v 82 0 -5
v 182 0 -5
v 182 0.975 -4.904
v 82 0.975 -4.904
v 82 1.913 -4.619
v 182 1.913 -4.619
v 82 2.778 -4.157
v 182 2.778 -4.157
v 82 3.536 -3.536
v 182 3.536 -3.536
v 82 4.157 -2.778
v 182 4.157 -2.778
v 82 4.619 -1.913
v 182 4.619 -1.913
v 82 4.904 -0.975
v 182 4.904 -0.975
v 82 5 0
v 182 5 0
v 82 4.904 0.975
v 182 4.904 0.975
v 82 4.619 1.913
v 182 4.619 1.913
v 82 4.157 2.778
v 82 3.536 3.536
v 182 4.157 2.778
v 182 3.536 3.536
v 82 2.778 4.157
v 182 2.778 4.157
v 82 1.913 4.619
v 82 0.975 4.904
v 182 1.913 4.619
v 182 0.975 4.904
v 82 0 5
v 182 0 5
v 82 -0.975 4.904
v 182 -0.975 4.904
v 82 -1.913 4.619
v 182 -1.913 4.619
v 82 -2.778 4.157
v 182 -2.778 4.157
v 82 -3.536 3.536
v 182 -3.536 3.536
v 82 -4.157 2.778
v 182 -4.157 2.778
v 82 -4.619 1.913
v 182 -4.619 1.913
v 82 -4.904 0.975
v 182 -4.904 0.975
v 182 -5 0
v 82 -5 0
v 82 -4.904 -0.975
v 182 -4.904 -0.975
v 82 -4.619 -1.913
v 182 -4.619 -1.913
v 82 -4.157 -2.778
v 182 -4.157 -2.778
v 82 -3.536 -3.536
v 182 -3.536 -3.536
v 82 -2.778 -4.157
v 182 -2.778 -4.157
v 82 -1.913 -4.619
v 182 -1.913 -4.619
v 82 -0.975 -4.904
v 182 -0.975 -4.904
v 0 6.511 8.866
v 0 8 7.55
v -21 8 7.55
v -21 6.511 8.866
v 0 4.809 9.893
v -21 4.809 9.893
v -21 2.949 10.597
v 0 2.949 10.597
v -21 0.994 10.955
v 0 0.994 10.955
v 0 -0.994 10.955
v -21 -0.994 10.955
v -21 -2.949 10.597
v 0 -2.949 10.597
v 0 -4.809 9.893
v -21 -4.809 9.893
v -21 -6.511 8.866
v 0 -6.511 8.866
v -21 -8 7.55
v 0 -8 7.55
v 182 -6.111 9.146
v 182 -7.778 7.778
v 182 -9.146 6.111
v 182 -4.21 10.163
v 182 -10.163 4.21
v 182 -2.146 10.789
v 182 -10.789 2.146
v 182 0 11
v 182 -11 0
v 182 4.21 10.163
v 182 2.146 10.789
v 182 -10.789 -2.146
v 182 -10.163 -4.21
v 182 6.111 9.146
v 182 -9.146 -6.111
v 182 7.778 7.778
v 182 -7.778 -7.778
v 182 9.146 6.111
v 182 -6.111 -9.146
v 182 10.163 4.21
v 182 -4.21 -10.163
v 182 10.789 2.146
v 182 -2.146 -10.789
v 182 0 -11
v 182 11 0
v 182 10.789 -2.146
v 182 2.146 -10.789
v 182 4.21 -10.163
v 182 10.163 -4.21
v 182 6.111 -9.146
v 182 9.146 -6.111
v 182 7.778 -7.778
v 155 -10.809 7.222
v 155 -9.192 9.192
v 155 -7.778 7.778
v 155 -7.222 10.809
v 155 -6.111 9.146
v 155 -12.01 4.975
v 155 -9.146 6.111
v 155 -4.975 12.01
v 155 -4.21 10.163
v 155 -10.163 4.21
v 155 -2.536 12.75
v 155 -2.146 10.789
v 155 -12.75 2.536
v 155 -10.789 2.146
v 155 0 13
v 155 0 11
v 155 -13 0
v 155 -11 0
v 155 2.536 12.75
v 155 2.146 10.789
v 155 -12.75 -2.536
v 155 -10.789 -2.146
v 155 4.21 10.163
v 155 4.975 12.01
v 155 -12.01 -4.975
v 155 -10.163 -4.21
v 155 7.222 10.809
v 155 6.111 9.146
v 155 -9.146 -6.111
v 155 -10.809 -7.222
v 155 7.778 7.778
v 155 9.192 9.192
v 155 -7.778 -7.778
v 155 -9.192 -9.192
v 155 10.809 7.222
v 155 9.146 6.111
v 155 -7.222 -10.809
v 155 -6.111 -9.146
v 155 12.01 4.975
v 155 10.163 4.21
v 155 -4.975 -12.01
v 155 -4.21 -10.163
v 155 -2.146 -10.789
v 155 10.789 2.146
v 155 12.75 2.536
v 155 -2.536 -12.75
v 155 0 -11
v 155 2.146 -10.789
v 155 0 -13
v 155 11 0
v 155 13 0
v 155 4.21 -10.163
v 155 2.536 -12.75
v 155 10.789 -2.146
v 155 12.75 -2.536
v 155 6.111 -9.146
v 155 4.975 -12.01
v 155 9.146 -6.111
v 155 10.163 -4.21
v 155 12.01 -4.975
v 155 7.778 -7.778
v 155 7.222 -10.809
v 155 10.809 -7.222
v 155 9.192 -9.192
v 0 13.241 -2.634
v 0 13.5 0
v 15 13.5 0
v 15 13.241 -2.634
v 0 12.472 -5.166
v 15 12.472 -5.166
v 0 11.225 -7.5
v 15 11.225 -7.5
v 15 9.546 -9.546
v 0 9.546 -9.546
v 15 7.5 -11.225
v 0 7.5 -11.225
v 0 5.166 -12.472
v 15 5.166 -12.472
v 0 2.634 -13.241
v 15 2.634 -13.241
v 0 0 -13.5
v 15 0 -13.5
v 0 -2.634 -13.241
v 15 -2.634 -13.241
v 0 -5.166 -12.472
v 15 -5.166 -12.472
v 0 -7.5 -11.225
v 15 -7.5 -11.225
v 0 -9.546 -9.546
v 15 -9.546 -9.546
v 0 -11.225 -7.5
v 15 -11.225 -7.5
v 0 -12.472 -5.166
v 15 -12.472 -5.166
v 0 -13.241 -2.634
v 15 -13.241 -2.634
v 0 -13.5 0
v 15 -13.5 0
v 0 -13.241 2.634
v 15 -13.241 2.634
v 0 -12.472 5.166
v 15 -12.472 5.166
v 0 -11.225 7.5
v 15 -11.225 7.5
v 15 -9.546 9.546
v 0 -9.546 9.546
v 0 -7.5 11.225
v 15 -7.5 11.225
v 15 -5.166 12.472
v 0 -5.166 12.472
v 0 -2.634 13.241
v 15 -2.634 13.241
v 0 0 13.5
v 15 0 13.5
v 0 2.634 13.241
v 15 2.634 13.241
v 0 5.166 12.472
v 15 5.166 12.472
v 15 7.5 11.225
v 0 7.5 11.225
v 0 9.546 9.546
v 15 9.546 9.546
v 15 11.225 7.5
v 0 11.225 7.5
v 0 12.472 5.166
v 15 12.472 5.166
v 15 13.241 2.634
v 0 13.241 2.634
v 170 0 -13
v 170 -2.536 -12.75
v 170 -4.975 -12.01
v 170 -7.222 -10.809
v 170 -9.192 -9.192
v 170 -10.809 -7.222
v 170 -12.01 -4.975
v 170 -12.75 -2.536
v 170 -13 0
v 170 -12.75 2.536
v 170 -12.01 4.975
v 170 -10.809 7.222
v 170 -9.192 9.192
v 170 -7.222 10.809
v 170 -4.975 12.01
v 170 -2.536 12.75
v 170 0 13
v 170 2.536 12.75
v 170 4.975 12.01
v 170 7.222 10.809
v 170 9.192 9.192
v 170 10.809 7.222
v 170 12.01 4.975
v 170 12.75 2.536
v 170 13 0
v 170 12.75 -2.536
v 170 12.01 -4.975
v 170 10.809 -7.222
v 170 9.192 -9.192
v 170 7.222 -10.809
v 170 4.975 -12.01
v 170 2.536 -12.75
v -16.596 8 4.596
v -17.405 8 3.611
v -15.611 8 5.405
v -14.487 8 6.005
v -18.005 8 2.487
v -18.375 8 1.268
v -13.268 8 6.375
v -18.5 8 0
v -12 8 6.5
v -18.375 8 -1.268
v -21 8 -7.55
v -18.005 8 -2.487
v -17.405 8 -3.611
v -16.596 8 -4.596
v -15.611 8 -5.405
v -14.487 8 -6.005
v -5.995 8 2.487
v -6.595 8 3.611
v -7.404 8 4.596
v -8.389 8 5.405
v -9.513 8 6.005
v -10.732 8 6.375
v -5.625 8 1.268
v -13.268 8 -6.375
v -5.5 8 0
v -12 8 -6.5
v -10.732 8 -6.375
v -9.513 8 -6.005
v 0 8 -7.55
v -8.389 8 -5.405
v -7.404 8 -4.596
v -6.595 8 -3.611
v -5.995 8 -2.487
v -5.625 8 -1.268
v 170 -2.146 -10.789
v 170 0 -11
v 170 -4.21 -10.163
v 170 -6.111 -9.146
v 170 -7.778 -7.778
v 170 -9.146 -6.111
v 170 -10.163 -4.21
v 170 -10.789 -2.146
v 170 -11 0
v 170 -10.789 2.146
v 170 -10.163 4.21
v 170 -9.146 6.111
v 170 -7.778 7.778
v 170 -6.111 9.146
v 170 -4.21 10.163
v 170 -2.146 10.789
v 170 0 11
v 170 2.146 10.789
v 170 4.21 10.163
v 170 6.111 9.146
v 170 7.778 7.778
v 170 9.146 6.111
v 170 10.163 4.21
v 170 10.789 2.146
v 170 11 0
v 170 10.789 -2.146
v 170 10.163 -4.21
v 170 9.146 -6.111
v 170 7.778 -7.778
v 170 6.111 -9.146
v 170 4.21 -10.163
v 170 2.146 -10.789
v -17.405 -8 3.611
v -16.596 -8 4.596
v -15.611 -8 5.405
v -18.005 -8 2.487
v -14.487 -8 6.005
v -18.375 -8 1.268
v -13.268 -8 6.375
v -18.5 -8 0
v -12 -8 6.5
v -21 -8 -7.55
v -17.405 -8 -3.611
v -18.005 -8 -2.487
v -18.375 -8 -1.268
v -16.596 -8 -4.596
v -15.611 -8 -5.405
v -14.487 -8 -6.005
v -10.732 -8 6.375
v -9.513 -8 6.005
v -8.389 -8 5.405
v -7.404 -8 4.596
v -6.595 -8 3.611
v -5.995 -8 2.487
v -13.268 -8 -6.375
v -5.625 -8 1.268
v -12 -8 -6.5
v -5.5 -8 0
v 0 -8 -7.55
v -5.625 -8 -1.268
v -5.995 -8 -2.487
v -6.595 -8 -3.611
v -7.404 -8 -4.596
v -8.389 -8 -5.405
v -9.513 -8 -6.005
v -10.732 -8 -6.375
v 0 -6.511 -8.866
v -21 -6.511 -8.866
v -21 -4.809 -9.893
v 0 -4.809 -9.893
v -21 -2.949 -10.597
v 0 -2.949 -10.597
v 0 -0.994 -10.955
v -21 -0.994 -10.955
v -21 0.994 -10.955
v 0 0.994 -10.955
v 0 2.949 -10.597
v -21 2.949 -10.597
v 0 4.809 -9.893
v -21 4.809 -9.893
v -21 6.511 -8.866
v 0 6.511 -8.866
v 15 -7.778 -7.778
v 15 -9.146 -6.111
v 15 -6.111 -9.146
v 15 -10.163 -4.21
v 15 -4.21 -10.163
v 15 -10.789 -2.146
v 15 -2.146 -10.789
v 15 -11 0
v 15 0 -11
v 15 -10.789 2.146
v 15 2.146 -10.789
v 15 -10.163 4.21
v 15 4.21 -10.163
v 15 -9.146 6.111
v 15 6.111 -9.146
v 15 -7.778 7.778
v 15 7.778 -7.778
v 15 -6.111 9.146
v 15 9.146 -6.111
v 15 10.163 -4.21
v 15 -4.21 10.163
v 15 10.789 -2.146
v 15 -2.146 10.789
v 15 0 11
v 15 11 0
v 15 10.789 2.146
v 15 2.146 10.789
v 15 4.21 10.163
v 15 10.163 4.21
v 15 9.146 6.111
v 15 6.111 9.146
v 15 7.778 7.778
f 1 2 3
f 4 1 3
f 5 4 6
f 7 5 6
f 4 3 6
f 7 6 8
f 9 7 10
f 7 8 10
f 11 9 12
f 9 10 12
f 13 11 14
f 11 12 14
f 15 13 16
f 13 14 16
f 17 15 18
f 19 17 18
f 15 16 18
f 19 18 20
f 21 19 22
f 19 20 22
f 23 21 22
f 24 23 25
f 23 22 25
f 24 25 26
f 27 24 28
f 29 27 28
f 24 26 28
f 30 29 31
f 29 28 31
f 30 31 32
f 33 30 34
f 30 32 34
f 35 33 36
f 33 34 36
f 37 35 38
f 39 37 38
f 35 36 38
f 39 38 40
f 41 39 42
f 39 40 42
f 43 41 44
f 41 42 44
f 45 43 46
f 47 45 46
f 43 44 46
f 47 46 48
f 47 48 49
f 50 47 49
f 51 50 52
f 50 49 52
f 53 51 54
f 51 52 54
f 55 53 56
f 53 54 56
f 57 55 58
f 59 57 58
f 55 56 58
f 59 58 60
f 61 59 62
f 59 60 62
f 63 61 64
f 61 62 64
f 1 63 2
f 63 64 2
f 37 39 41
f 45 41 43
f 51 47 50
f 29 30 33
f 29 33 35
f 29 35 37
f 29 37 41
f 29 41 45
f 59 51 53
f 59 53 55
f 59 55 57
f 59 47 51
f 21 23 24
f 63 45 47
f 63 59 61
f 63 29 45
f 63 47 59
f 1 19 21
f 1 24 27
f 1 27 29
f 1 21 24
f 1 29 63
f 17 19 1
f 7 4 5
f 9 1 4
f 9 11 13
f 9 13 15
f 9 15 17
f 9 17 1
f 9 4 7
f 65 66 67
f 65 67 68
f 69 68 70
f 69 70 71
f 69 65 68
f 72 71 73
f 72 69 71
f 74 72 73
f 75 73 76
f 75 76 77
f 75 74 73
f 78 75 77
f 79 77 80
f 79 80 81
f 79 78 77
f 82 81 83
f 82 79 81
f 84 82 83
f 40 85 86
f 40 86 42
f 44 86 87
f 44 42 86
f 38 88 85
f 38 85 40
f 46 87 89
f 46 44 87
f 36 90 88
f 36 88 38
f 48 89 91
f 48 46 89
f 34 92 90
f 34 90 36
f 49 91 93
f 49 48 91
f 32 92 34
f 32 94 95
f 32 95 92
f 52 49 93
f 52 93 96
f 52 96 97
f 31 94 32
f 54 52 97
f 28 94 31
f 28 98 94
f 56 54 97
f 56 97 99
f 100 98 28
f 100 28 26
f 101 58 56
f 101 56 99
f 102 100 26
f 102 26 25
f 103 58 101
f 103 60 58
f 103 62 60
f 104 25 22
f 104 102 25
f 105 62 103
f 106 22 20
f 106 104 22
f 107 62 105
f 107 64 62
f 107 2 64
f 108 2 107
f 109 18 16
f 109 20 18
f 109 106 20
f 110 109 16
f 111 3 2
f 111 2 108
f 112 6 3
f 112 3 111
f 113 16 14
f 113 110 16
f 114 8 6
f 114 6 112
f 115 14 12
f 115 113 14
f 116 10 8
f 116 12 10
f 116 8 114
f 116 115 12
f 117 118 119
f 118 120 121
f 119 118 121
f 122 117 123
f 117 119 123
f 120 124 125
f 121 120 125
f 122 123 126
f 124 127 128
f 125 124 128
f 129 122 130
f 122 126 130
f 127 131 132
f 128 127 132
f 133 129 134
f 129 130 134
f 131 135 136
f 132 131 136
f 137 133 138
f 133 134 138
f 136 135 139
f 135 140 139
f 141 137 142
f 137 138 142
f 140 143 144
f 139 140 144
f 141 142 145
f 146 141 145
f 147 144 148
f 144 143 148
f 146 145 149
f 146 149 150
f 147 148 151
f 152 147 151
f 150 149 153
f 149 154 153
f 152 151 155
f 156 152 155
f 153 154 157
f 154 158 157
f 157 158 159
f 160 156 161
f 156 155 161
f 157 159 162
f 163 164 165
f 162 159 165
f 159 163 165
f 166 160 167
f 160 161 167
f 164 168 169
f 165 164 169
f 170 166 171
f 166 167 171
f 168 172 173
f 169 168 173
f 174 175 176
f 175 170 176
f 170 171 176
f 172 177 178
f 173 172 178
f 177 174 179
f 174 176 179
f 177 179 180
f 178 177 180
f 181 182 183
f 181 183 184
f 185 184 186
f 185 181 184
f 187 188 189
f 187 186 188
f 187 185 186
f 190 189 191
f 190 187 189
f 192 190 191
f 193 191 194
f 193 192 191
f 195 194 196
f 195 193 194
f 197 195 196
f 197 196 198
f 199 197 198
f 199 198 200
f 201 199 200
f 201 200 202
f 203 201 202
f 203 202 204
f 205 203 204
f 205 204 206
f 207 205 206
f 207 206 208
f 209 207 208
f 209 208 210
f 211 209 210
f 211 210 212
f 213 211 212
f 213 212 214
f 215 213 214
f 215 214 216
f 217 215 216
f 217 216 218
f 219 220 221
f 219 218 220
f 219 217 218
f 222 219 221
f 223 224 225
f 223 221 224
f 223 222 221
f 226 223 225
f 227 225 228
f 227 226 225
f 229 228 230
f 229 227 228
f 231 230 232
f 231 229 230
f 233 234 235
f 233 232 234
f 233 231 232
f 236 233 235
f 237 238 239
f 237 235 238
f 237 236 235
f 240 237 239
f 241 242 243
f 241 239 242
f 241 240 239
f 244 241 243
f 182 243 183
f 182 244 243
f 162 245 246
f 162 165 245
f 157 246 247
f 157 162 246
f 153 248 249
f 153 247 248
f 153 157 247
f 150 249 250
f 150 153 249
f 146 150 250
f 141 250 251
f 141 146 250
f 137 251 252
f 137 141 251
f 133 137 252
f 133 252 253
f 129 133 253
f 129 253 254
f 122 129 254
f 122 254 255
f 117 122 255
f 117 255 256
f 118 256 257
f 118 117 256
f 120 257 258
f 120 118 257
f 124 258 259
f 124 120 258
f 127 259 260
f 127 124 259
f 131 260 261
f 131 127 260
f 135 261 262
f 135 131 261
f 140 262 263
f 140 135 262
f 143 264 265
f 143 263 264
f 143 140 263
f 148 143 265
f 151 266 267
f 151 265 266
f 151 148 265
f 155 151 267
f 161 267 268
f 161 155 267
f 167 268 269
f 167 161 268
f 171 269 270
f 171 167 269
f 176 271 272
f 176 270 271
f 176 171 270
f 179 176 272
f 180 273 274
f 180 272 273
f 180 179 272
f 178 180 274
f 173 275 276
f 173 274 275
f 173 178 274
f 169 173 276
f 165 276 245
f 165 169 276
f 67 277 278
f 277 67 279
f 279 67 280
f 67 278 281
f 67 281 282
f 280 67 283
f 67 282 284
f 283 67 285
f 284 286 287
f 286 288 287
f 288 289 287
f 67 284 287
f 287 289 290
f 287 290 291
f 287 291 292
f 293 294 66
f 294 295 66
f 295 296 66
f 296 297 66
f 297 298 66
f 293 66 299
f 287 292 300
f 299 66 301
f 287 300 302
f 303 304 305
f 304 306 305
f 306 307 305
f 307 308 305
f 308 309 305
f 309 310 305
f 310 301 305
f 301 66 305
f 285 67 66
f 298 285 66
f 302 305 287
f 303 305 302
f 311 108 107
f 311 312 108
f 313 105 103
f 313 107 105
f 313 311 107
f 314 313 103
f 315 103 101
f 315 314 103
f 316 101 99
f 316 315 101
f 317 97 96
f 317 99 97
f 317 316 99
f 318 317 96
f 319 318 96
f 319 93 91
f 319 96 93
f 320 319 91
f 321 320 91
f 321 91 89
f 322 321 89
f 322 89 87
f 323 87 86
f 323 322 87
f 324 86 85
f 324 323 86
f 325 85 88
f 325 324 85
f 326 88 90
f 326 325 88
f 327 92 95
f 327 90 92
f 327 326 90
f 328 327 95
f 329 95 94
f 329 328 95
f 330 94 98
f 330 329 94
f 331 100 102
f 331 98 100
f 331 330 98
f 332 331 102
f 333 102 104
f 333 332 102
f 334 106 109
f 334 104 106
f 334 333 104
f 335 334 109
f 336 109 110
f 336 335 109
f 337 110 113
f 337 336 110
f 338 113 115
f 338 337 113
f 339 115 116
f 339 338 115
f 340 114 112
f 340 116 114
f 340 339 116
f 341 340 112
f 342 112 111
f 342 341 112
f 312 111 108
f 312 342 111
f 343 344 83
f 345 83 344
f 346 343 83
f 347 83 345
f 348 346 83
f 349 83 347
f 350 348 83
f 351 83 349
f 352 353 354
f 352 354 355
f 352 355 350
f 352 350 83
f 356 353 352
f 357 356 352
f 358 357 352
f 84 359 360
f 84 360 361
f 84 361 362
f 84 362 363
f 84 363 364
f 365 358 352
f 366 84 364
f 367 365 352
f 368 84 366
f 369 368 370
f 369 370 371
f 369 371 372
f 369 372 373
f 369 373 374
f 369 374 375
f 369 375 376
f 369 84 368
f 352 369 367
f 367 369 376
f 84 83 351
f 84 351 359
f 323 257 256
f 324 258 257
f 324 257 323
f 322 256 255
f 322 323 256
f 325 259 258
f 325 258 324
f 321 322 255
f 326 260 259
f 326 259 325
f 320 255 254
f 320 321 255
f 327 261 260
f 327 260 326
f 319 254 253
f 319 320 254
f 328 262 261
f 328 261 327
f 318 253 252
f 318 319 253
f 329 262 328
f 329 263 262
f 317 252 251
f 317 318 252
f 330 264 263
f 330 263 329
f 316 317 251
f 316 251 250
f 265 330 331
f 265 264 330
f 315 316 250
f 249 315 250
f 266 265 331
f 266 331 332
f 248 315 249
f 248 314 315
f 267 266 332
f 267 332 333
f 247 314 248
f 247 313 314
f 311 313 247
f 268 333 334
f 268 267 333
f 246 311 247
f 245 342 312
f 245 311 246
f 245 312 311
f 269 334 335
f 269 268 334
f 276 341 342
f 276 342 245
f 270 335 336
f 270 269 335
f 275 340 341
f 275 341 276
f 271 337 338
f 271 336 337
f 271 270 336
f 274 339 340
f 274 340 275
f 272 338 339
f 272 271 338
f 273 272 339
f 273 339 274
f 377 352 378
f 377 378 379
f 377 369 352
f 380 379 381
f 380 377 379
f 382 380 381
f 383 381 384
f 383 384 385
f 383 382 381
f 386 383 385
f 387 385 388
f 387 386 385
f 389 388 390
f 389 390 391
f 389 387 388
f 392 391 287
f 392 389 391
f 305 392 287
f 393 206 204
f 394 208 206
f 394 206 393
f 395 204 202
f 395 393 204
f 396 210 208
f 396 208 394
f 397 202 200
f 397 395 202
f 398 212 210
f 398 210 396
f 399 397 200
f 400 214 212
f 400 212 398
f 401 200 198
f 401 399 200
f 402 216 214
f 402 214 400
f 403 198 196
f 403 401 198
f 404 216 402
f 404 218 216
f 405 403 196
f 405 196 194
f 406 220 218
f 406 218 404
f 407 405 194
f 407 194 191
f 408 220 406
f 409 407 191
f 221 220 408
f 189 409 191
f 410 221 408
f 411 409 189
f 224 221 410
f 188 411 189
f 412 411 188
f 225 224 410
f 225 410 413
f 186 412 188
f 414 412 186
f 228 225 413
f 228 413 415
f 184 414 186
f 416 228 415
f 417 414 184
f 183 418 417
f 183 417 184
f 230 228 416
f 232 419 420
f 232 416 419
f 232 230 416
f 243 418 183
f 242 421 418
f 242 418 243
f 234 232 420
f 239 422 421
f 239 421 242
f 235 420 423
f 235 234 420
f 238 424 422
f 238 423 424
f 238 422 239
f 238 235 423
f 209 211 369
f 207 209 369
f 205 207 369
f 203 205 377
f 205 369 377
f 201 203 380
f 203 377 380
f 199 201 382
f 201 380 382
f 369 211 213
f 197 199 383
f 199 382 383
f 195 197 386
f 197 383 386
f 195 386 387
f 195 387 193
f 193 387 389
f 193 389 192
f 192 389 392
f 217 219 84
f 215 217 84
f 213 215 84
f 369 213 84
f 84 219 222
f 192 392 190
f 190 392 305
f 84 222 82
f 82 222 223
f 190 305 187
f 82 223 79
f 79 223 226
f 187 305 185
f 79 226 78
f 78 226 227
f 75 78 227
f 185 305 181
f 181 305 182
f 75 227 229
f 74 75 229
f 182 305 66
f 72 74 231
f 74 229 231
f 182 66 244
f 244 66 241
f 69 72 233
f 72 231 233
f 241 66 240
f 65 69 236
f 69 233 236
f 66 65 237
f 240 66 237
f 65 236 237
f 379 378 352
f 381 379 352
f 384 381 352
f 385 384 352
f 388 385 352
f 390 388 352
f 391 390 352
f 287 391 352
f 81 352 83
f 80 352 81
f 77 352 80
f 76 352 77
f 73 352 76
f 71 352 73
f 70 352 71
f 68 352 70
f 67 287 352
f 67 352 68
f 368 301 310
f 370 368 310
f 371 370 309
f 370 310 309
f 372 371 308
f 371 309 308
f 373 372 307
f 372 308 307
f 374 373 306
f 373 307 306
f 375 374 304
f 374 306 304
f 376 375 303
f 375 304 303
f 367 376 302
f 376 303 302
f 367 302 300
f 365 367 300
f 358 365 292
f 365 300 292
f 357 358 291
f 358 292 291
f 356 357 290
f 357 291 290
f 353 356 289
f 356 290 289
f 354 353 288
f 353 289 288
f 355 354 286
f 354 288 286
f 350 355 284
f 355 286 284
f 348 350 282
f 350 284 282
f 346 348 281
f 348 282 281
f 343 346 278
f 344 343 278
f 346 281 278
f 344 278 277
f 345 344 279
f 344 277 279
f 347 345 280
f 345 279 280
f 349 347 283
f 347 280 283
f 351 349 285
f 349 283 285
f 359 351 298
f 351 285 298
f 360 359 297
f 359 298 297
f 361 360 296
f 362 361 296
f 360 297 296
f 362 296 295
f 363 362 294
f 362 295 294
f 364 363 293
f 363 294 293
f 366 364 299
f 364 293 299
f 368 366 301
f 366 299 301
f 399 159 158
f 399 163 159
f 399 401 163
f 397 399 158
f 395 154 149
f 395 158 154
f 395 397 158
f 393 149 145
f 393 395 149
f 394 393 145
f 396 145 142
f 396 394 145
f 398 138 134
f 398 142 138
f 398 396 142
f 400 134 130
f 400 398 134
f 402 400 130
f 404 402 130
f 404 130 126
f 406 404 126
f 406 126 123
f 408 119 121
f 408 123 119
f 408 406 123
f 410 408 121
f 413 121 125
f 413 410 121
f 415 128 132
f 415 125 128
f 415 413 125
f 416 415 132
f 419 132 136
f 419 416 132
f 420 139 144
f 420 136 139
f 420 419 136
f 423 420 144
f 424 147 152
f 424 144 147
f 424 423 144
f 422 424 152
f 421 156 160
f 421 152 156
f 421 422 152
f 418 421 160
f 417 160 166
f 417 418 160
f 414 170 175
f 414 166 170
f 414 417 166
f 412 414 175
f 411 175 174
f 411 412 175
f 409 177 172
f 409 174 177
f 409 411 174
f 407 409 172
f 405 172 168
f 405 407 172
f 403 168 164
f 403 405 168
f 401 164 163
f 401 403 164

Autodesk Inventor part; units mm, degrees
ref_plane "YZ Plane" through (0, 0, 0) normal (1, 0, 0) x (0, 1, 0)
ref_plane "XZ Plane" through (0, 0, 0) normal (0, 1, 0) x (-1, 0, 0)
ref_plane "XY Plane" through (0, 0, 0) normal (0, 0, 1) x (1, 0, 0)
sketch "スケッチ1" plane through (0, 0, 0) normal (1, 0, 0) x (0, 1, 0)
  circle A0 centre (0, 0) radius 13.5
  dimension "d0" = 27
extrude "押し出し1" add sketch "スケッチ1" along normal blind 15
sketch "スケッチ2" plane through (15, 0, 0) normal (1, 0, 0) x (0, 0, -1)
  circle A0 centre (0, 0) radius 11
  dimension "d3" = 22
extrude "押し出し2" add sketch "スケッチ2" along normal blind 140
sketch "スケッチ3" plane through (155, 0, 0) normal (1, 0, 0) x (0, 0, -1)
  circle A0 centre (0, 0) radius 13
  dimension "d6" = 26
extrude "押し出し3" add sketch "スケッチ3" along normal blind 15
sketch "スケッチ4" plane through (170, 0, 0) normal (1, 0, 0) x (0, 0, -1)
  circle A0 centre (0, 0) radius 11
  dimension "d9" = 22
extrude "押し出し4" add sketch "スケッチ4" along normal blind 12
thread "ねじ1" size "M22x3" class "6g" standard "ANSI Metric M Profile" full length
sketch "スケッチ5" plane through (0, 0, 0) normal (-1, 0, 0) x (0, 0, 1)
  circle A0 centre (0, 0) radius 11
  line L0 (7.5498, 8) -> (-7.5498, 8)
  line L1 (0, 0) -> (-11, 0)
  line L2 (7.5498, -8) -> (-7.5498, -8)
  dimension "d14" = 22
  dimension "d15" = 8
extrude "押し出し5" add sketch "スケッチ5" along normal blind 21 contours A0 L2 L0
thread "ねじ2" size "M22x3" class "6g" standard "ANSI Metric M Profile" full length
sketch "スケッチ6" plane through (0, 8, 7.5498) normal (0, 1, 0) x (1, 0, 0)
  circle A0 centre (-12, 7.5498) radius 6.5
  line L0 (-21, 0) -> (-21, 15.0997) projected
  line L1 (-21, 7.5498) -> (0, 7.5498)
  dimension "d20" = 13
  dimension "d21" = 0
  dimension "d22" = 9
extrude "押し出し6" cut sketch "スケッチ6" against normal through all
sketch "スケッチ7" plane through (182, 0, 0) normal (1, 0, 0) x (0, 0, -1)
  circle A0 centre (0, 0) radius 5
  dimension "d25" = 10
extrude "押し出し7" cut sketch "スケッチ7" against normal blind 100
properties part number "aircilinder_100_under" material "アルミニウム 6061"
